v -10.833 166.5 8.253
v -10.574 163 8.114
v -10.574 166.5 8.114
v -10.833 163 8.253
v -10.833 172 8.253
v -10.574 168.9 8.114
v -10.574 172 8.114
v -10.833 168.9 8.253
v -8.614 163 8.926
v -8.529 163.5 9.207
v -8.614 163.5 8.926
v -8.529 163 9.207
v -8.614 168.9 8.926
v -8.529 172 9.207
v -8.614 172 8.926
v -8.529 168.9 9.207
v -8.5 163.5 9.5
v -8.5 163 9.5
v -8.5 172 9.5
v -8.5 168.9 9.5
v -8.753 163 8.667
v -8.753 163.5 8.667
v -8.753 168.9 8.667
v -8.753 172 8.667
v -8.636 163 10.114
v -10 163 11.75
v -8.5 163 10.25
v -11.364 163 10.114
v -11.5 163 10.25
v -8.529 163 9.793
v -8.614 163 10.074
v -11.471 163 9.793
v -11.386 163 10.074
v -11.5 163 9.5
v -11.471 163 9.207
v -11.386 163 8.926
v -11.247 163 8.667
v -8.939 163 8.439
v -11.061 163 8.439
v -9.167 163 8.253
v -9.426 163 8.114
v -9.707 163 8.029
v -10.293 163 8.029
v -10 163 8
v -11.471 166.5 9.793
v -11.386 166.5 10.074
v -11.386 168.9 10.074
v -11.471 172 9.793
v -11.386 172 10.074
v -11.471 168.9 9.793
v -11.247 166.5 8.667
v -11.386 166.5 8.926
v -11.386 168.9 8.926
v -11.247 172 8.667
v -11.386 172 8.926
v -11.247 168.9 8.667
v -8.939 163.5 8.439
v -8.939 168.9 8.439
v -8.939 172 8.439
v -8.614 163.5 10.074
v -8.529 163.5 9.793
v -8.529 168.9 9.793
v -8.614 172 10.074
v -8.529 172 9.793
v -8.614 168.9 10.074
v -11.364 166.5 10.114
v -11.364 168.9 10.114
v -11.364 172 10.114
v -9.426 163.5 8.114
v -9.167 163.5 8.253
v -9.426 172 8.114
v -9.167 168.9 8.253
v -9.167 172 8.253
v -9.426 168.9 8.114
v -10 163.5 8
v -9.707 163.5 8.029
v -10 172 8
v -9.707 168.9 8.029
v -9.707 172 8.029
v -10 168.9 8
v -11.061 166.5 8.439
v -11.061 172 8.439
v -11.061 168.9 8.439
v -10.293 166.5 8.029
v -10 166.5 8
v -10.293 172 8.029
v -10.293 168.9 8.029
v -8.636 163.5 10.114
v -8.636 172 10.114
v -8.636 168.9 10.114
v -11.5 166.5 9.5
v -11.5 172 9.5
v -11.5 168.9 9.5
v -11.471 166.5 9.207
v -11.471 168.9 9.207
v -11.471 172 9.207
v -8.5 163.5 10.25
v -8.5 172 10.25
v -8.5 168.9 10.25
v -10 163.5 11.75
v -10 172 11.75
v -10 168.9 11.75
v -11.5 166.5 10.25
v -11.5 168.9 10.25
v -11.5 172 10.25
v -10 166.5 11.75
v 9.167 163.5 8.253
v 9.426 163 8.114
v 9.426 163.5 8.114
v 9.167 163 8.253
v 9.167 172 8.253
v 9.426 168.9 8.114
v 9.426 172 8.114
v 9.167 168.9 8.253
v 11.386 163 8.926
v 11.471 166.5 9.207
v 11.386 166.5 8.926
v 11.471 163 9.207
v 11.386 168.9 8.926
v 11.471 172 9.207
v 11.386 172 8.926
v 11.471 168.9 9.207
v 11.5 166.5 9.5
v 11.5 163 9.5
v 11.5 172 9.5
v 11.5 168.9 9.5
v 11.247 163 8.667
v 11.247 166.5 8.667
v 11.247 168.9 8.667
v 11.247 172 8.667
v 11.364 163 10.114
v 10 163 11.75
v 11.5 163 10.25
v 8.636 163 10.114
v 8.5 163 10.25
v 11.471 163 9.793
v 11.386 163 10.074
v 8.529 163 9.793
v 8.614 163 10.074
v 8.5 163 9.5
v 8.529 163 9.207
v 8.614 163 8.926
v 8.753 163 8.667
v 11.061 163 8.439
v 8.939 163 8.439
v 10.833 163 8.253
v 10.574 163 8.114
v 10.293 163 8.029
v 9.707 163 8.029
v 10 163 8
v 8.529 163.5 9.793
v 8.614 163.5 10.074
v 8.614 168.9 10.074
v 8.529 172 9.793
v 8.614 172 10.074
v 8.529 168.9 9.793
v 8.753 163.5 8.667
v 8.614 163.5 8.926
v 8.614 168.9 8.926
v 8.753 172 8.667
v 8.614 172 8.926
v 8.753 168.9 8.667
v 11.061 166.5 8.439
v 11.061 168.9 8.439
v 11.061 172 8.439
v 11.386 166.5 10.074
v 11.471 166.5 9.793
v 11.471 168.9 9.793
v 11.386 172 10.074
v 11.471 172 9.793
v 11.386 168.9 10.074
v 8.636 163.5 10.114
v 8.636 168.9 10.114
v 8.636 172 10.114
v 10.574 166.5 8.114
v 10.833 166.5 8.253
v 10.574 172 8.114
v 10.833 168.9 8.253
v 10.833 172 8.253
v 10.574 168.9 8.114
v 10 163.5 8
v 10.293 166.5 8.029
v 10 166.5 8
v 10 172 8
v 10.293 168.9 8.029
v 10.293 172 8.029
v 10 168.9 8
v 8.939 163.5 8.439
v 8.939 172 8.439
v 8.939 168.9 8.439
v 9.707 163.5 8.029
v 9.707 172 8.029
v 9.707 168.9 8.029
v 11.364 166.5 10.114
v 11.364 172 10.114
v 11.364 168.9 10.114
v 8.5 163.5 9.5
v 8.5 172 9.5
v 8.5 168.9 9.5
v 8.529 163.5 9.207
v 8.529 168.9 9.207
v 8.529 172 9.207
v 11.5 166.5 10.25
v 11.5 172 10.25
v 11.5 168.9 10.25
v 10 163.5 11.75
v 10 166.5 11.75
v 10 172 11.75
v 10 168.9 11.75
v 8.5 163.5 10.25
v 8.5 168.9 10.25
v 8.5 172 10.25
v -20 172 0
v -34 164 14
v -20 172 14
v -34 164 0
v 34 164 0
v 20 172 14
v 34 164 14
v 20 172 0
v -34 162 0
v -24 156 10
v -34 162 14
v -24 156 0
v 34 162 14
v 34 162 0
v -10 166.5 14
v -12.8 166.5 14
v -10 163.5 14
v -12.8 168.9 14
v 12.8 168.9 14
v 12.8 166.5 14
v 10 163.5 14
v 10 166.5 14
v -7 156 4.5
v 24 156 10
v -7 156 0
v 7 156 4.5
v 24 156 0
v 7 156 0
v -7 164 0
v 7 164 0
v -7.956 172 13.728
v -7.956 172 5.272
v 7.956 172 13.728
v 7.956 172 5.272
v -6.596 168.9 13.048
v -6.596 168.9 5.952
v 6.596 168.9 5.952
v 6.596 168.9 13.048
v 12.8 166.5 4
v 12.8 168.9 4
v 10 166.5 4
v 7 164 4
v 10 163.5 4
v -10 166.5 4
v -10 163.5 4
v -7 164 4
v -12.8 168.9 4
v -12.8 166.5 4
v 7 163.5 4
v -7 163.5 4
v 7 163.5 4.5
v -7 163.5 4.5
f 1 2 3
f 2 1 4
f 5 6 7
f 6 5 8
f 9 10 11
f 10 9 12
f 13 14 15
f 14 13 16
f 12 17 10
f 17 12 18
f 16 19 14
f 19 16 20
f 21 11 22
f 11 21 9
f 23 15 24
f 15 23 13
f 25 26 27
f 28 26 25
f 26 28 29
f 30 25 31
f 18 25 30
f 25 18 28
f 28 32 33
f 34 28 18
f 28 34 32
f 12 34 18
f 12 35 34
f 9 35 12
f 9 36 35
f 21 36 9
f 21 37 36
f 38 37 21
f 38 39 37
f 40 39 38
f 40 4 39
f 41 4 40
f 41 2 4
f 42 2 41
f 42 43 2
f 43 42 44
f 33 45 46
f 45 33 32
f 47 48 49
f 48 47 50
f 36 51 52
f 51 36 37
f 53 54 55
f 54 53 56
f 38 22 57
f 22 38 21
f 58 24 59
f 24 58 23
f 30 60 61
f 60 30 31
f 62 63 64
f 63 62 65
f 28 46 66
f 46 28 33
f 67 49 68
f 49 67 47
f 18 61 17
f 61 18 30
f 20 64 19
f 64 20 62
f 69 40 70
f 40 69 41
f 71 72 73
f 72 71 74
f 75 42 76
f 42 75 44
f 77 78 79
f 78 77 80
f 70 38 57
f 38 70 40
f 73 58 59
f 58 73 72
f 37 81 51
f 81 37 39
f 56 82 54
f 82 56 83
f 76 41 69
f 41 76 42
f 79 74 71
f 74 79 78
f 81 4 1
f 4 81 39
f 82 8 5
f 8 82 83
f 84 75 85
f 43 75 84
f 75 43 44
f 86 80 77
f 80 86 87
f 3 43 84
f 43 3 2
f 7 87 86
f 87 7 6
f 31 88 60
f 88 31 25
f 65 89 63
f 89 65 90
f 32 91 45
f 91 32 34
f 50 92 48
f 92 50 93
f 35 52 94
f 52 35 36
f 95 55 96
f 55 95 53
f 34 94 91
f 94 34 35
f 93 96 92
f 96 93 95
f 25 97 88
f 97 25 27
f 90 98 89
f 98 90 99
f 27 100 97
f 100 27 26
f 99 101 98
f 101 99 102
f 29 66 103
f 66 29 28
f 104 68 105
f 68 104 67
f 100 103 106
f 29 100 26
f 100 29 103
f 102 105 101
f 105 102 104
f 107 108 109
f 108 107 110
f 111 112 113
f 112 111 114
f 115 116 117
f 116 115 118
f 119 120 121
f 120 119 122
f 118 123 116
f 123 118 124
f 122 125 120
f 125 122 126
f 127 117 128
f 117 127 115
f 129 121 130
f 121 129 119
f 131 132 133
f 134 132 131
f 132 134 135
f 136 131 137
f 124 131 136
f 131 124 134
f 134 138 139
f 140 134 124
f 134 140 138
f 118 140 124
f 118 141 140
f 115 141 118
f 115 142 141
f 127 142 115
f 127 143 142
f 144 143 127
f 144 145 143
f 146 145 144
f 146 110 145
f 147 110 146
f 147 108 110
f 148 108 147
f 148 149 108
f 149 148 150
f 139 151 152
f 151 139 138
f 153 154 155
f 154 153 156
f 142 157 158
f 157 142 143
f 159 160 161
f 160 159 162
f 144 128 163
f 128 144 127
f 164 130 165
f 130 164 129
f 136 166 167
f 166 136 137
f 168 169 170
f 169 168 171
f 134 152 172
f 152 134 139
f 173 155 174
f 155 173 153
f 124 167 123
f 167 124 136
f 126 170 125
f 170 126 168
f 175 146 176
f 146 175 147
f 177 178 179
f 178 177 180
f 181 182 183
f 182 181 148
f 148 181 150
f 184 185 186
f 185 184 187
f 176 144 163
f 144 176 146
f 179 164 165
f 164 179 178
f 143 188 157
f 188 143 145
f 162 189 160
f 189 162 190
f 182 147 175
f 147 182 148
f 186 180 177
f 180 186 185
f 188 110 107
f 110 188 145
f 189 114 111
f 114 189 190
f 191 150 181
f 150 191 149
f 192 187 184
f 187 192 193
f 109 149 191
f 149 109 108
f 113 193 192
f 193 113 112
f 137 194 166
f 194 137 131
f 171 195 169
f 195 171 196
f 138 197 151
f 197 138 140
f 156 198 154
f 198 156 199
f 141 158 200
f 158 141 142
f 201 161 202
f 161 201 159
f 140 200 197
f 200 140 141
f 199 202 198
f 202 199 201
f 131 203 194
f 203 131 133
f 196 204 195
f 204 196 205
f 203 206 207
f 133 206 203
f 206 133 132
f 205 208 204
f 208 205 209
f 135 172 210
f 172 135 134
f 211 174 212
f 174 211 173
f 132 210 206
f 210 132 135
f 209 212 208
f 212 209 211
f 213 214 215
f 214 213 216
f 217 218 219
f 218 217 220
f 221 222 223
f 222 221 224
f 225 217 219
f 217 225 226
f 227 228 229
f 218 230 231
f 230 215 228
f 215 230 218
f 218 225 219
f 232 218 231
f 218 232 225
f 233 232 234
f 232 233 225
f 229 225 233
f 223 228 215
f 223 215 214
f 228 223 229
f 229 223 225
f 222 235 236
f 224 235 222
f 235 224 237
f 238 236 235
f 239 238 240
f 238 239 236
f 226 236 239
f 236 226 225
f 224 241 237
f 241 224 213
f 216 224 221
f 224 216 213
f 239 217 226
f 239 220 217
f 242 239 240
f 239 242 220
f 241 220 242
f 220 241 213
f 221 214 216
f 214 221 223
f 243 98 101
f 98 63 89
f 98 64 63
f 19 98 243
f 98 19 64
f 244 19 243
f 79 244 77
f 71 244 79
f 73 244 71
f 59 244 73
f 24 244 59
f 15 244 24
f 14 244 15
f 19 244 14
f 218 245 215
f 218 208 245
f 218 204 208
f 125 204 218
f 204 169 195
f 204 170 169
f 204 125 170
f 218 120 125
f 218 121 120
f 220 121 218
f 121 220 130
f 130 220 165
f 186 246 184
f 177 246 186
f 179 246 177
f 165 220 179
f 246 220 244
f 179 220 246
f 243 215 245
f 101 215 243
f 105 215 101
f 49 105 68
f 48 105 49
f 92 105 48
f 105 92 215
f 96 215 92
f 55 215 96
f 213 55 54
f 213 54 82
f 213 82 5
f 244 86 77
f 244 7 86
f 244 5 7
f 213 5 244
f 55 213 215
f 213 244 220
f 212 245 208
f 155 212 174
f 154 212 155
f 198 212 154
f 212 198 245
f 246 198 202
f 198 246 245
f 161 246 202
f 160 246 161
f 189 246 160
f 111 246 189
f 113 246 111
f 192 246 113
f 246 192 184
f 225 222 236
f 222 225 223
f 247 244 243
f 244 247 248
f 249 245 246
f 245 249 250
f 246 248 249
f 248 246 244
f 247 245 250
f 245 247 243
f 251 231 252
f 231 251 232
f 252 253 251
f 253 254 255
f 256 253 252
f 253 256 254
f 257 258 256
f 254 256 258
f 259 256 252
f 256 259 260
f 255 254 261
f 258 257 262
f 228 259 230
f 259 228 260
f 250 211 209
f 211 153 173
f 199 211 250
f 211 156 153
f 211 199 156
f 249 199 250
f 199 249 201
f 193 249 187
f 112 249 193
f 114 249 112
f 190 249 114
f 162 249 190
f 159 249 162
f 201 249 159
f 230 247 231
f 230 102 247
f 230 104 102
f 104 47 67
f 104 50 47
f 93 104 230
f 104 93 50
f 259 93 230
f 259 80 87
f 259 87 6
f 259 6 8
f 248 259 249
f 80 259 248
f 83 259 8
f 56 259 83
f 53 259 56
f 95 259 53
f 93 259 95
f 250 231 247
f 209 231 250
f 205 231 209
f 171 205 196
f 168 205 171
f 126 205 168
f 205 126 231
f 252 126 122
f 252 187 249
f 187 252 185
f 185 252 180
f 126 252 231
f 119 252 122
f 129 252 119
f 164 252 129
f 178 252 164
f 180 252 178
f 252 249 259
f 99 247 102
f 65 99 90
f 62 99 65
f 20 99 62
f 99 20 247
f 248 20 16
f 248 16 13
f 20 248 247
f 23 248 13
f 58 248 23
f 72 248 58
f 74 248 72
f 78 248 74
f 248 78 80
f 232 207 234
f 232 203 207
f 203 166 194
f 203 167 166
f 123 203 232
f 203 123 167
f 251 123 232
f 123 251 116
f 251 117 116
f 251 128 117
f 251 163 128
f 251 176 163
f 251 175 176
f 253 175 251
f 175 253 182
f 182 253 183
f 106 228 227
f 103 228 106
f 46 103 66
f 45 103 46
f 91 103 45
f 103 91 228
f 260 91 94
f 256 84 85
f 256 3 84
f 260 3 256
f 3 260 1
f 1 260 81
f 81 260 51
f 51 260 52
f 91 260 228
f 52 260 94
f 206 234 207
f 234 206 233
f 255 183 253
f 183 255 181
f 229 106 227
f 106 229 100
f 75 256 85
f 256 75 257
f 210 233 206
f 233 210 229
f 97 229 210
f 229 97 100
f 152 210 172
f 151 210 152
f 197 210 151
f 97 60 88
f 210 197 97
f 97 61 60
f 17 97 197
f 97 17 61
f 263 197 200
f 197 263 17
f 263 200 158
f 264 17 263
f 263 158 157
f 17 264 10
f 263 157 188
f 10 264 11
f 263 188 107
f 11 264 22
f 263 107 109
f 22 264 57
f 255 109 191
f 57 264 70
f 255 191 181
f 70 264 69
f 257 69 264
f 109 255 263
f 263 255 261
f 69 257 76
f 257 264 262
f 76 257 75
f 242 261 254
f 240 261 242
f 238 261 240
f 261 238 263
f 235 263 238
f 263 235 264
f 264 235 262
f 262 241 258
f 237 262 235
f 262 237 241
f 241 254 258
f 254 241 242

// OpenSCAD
// Test script to verify the new VL53L0X front bumper and side ToF mounts
$fn = 32;

CHASSIS_W    = 116.0;
CHASSIS_L    = 172.0;
FLOOR_T      = 4.0;
WALL_T       = 4.0;
WALL_H       = 30.0;

module teardrop_hole_x(d = 9.0, h = 10.0) {
    r = d / 2.0;
    side = r * sqrt(2.0);
    union() {
        rotate([0, 90, 0]) cylinder(d=d, h=h);
        translate([0, 0, r * 0.5])
            rotate([45, 0, 0])
                translate([0, -side/2.0, -side/2.0])
                    cube([h, side, side]);
    }
}

module teardrop_hole_y(d = 16.6, h = 15.0) {
    r = d / 2.0;
    side = r * sqrt(2.0);
    union() {
        rotate([-90, 0, 0]) cylinder(d=d, h=h);
        translate([0, 0, r * 0.5])
            rotate([0, 45, 0])
                translate([-side/2.0, 0, -side/2.0])
                    cube([side, h, side]);
    }
}

module front_bumper_and_vl53l0x() {
    difference() {
        // Khối cản trước khí động học & bệ gá VL53L0X
        union() {
            hull() {
                // Mặt trước trung tâm (Y = CHASSIS_L)
                translate([-20.0, CHASSIS_L - 2.0, 0])
                    cube([40.0, 2.0, 14.0]);
                // Hai góc vát sau 45° chống móc vướng (Y = CHASSIS_L - 10.0)
                translate([-34.0, CHASSIS_L - 10.0, 0])
                    cube([68.0, 2.0, 14.0]);
                // Phần bệ đế nối vào sàn (Y = CHASSIS_L - 16.0)
                translate([-24.0, CHASSIS_L - 16.0, 0])
                    cube([48.0, 6.0, 10.0]);
            }
        }

        // 1. Cửa sổ quang học ToF phát/thu laser góc mở rộng 35° (vượt 25° FoV)
        hull() {
            // Cửa sổ trong tại mặt trước cảm biến
            translate([-5.5, CHASSIS_L - 5.6, 6.5])
                cube([11.0, 0.2, 6.0]);
            // Cửa sổ ngoài mở rộng tại mặt cản trước
            translate([-8.0, CHASSIS_L + 0.1, 5.25])
                cube([16.0, 0.2, 8.5]);
        }

        // 2. Khe trượt cài module cảm biến VL53L0X (PCB 25x11x1.6mm)
        translate([-12.8, CHASSIS_L - 5.5, FLOOR_T])
            cube([25.6, 2.4, 11.0]);

        // 3. Hốc thoáng mặt sau linh kiện SMD trên board
        translate([-10.0, CHASSIS_L - 8.5, FLOOR_T])
            cube([20.0, 3.0, 10.0]);

        // 4. Hai lỗ ốc bắt M2.5 / M3 chuẩn pitch 20.0mm (X = ±10.0mm, Z = 9.5mm)
        translate([-10.0, CHASSIS_L - 9.0, 9.5])
            teardrop_hole_y(d=3.0, h=10.0);
        translate([ 10.0, CHASSIS_L - 9.0, 9.5])
            teardrop_hole_y(d=3.0, h=10.0);

        // 5. Rãnh luồn cáp I2C (4P Dupont / JST) xuyên sàn
        translate([-7.0, CHASSIS_L - 18.0, -0.5])
            cube([14.0, 10.0, FLOOR_T + 1.0]);
    }
}

front_bumper_and_vl53l0x();
